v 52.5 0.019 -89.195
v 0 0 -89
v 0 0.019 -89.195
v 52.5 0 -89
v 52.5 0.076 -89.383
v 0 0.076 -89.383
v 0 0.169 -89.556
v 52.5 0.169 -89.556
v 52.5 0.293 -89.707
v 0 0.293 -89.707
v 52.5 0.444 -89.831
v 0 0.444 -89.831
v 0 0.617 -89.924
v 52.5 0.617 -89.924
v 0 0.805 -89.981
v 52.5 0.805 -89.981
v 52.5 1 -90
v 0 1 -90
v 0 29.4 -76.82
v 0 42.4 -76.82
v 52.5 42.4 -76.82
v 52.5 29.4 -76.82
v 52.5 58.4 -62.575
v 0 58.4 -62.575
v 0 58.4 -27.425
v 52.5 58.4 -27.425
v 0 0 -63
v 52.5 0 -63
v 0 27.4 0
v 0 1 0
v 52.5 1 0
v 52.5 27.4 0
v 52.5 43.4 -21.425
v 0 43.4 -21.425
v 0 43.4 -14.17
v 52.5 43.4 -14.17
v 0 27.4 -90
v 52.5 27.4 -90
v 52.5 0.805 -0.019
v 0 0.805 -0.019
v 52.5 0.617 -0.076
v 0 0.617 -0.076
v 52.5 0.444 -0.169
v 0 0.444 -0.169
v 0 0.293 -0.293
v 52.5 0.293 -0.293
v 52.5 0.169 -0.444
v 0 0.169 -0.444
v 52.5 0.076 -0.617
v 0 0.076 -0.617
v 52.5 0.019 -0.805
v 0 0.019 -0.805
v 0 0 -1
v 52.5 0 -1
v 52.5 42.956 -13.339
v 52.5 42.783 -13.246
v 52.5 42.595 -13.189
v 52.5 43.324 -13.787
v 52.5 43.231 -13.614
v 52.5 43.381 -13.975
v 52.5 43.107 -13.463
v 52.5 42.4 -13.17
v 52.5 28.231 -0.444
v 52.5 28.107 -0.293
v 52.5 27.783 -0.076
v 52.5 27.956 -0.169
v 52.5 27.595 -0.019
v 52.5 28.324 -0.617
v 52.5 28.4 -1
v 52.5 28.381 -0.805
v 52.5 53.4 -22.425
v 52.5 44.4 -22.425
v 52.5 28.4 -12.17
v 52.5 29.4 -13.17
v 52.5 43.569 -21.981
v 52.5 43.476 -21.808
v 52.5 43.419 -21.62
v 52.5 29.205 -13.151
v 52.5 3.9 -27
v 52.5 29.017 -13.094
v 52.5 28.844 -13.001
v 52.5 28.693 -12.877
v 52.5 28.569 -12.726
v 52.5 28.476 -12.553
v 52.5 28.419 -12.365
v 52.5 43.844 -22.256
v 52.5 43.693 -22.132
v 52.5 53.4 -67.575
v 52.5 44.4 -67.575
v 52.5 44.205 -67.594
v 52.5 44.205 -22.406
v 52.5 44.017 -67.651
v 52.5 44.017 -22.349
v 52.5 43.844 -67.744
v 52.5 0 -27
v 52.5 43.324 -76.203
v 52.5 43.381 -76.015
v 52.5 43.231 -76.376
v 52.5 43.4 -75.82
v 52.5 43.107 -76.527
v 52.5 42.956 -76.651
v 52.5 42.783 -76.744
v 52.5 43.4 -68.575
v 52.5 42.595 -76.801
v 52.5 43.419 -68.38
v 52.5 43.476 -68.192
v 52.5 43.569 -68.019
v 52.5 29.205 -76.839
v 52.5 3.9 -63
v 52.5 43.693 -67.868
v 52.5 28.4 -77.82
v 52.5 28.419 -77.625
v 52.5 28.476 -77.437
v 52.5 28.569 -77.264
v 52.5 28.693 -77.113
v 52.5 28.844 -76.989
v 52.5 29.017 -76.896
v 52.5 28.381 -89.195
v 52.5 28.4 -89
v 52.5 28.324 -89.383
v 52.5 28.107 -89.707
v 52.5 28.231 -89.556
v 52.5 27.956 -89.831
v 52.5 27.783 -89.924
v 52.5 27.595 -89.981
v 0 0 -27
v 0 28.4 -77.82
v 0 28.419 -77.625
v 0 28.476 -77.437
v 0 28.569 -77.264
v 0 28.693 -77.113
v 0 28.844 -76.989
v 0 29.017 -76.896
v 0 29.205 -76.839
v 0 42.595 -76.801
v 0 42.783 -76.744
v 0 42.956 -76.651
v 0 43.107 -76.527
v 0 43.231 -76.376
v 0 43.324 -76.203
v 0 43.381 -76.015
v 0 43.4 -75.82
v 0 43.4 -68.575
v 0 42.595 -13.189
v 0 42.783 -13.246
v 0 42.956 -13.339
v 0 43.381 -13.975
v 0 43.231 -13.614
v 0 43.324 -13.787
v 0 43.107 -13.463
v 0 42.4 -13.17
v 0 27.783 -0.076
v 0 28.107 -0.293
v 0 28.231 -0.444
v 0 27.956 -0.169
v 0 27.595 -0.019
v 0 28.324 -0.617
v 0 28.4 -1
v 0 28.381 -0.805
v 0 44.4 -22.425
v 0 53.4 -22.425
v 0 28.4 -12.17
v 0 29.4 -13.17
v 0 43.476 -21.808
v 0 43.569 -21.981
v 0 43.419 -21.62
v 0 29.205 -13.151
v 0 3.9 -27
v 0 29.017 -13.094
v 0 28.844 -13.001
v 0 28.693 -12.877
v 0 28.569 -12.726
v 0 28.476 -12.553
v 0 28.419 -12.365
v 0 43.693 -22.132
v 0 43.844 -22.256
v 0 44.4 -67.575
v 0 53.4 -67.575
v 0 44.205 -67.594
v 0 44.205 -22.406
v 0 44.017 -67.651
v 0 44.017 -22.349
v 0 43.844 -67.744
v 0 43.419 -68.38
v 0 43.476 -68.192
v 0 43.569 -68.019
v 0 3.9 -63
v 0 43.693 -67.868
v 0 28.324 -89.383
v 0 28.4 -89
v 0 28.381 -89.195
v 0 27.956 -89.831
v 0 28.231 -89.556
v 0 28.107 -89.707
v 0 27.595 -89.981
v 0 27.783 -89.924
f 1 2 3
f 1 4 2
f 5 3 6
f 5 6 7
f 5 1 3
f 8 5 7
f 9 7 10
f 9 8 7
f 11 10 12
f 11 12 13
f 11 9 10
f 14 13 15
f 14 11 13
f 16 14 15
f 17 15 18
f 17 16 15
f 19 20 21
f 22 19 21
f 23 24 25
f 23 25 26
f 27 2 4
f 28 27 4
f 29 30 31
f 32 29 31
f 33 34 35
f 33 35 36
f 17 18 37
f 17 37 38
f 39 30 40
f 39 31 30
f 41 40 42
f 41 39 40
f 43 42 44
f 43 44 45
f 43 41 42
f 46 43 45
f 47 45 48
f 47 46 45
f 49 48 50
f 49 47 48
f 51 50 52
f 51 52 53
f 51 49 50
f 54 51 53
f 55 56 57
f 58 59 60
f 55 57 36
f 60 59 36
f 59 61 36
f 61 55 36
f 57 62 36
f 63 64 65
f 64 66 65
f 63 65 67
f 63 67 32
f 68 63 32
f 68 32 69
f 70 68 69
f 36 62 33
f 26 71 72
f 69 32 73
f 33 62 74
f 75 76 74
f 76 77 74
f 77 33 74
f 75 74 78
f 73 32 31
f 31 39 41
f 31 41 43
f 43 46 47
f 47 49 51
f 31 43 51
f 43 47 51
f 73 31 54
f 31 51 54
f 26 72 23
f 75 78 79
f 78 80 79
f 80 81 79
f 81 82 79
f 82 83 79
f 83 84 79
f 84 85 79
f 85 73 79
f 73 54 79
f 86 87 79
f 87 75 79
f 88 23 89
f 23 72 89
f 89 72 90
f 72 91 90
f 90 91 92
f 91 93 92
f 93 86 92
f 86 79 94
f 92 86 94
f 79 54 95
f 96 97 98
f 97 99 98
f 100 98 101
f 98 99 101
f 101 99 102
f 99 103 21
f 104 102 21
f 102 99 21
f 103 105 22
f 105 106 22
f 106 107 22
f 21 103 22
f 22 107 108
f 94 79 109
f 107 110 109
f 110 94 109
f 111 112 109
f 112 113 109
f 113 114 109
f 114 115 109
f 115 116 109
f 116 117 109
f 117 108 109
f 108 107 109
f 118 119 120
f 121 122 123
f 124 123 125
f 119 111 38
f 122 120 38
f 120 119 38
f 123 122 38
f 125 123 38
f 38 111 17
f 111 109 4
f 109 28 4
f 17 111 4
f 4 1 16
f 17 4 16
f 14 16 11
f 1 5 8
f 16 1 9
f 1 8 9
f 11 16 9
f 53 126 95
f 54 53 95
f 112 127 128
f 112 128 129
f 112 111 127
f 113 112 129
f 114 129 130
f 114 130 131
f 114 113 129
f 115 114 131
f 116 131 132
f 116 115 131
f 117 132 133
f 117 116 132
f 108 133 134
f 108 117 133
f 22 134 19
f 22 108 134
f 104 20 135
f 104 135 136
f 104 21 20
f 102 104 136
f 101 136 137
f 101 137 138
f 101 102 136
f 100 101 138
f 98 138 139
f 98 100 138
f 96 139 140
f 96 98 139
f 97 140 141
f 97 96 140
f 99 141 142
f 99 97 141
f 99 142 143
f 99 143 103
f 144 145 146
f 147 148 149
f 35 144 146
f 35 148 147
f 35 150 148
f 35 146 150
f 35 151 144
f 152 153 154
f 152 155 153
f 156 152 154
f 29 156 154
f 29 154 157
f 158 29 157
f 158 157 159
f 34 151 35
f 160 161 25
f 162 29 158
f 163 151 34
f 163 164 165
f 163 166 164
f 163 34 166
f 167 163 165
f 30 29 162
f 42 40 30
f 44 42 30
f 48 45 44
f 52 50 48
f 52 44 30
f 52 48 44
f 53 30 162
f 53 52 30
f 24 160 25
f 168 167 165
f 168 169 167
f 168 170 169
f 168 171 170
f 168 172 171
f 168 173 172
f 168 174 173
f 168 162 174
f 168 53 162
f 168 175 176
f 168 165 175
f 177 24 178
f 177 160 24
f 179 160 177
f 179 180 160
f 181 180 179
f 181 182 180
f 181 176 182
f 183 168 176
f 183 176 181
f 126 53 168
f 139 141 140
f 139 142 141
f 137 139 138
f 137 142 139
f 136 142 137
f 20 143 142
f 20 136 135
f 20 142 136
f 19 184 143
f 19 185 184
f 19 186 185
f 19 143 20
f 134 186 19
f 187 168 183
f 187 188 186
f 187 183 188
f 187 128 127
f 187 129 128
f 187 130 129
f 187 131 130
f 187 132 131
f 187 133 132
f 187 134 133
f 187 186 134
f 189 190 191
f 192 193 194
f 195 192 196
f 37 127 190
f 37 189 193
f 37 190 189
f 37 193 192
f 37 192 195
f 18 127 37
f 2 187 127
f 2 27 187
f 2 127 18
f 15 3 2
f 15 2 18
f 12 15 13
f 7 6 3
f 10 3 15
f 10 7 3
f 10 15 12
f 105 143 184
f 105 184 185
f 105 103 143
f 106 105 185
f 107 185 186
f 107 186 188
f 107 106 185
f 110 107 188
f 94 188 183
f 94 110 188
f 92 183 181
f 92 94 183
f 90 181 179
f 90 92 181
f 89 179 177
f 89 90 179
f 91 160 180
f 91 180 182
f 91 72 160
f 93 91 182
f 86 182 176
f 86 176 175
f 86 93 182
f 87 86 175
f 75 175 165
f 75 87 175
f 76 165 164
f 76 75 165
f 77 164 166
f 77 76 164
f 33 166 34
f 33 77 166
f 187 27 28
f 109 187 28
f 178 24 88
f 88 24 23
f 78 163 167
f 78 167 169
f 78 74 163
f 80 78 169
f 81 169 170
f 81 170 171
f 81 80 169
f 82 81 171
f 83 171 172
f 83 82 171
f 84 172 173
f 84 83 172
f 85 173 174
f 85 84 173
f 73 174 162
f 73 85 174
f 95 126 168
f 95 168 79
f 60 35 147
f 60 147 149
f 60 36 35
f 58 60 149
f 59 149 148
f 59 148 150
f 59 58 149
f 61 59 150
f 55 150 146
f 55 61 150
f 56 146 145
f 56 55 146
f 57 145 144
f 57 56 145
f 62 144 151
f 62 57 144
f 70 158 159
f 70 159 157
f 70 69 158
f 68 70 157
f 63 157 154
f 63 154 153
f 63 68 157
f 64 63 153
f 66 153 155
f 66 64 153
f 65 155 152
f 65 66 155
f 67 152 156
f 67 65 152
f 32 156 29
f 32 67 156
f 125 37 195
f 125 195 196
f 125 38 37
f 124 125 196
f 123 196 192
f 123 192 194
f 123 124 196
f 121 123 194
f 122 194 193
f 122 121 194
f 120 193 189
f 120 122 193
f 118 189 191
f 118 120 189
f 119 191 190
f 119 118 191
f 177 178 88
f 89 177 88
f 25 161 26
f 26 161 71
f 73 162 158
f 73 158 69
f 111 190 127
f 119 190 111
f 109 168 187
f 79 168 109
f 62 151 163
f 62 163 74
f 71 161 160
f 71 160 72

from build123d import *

# Parameters (mm, degrees)
SKETCH_1_W          = 52.5
SKETCH_1_H          = 90
EXTRUDE_1_DEPTH     = 58.4
SKETCH_3_W          = 52.5
SKETCH_3_H          = 22.425
CUT_EXTRUDE_1_DEPTH = 15
SKETCH_4_W          = 52.5
SKETCH_4_H          = 13.18
SKETCH_4_H_2        = 13.17
CUT_EXTRUDE_2_DEPTH = 15
CHAMFER_1_SIZE      = 5
SKETCH_5_W          = 52.5
SKETCH_5_H          = 36
CUT_EXTRUDE_3_DEPTH = 3.9
FILLET_1_R          = 1


with BuildPart() as part:
    # Эскиз1 → Бобышка-Вытянуть1 (new body)
    with BuildSketch(Plane(origin=(0, 0, 0), x_dir=(1, 0, 0), z_dir=(0, 1, 0))):
        with Locations((26.25, 45)):
            Rectangle(SKETCH_1_W, SKETCH_1_H)
    extrude(amount=EXTRUDE_1_DEPTH)

    # Эскиз3 → Вырез-Вытянуть1 (cut)
    with BuildSketch(Plane(origin=(0, 58.4, 0), x_dir=(1, 0, 0), z_dir=(0, 1, 0))):
        with Locations((26.25, 78.7875)):
            Rectangle(SKETCH_3_W, SKETCH_3_H)
        with Locations((26.25, 11.2125)):
            Rectangle(SKETCH_3_W, SKETCH_3_H)
    extrude(amount=-CUT_EXTRUDE_1_DEPTH, mode=Mode.SUBTRACT)

    # Эскиз4 → Вырез-Вытянуть2 (cut)
    with BuildSketch(Plane(origin=(0, 43.4, 0), x_dir=(1, 0, 0), z_dir=(0, 1, 0))):
        with Locations((26.25, 83.41)):
            Rectangle(SKETCH_4_W, SKETCH_4_H)
        with Locations((26.25, 6.585)):
            Rectangle(SKETCH_4_W, SKETCH_4_H_2)
    extrude(amount=-CUT_EXTRUDE_2_DEPTH, mode=Mode.SUBTRACT)

    # Фаска1
    chamfer_1_edges = [part.edges().sort_by_distance(p)[0] for p in [
        (26.25, 58.4, -67.575),
        (26.25, 58.4, -22.425),
    ]]
    chamfer(chamfer_1_edges, length=CHAMFER_1_SIZE)

    # Эскиз5 → Вырез-Вытянуть3 (cut)
    with BuildSketch(Plane.XZ):
        with Locations((26.25, -45)):
            Rectangle(SKETCH_5_W, SKETCH_5_H)
    extrude(amount=-CUT_EXTRUDE_3_DEPTH, mode=Mode.SUBTRACT)

    # Скругление1
    fillet_1_edges = [part.edges().sort_by_distance(p)[0] for p in [
        (26.25, 43.4, -67.575),
        (26.25, 43.4, -22.425),
        (26.25, 0, -90),
        (26.25, 28.4, -90),
        (26.25, 28.4, -76.82),
        (26.25, 43.4, -76.82),
        (26.25, 0, 0),
        (26.25, 28.4, -13.17),
        (26.25, 28.4, 0),
        (26.25, 43.4, -13.17),
    ]]
    fillet(fillet_1_edges, radius=FILLET_1_R)


solid = part.part
